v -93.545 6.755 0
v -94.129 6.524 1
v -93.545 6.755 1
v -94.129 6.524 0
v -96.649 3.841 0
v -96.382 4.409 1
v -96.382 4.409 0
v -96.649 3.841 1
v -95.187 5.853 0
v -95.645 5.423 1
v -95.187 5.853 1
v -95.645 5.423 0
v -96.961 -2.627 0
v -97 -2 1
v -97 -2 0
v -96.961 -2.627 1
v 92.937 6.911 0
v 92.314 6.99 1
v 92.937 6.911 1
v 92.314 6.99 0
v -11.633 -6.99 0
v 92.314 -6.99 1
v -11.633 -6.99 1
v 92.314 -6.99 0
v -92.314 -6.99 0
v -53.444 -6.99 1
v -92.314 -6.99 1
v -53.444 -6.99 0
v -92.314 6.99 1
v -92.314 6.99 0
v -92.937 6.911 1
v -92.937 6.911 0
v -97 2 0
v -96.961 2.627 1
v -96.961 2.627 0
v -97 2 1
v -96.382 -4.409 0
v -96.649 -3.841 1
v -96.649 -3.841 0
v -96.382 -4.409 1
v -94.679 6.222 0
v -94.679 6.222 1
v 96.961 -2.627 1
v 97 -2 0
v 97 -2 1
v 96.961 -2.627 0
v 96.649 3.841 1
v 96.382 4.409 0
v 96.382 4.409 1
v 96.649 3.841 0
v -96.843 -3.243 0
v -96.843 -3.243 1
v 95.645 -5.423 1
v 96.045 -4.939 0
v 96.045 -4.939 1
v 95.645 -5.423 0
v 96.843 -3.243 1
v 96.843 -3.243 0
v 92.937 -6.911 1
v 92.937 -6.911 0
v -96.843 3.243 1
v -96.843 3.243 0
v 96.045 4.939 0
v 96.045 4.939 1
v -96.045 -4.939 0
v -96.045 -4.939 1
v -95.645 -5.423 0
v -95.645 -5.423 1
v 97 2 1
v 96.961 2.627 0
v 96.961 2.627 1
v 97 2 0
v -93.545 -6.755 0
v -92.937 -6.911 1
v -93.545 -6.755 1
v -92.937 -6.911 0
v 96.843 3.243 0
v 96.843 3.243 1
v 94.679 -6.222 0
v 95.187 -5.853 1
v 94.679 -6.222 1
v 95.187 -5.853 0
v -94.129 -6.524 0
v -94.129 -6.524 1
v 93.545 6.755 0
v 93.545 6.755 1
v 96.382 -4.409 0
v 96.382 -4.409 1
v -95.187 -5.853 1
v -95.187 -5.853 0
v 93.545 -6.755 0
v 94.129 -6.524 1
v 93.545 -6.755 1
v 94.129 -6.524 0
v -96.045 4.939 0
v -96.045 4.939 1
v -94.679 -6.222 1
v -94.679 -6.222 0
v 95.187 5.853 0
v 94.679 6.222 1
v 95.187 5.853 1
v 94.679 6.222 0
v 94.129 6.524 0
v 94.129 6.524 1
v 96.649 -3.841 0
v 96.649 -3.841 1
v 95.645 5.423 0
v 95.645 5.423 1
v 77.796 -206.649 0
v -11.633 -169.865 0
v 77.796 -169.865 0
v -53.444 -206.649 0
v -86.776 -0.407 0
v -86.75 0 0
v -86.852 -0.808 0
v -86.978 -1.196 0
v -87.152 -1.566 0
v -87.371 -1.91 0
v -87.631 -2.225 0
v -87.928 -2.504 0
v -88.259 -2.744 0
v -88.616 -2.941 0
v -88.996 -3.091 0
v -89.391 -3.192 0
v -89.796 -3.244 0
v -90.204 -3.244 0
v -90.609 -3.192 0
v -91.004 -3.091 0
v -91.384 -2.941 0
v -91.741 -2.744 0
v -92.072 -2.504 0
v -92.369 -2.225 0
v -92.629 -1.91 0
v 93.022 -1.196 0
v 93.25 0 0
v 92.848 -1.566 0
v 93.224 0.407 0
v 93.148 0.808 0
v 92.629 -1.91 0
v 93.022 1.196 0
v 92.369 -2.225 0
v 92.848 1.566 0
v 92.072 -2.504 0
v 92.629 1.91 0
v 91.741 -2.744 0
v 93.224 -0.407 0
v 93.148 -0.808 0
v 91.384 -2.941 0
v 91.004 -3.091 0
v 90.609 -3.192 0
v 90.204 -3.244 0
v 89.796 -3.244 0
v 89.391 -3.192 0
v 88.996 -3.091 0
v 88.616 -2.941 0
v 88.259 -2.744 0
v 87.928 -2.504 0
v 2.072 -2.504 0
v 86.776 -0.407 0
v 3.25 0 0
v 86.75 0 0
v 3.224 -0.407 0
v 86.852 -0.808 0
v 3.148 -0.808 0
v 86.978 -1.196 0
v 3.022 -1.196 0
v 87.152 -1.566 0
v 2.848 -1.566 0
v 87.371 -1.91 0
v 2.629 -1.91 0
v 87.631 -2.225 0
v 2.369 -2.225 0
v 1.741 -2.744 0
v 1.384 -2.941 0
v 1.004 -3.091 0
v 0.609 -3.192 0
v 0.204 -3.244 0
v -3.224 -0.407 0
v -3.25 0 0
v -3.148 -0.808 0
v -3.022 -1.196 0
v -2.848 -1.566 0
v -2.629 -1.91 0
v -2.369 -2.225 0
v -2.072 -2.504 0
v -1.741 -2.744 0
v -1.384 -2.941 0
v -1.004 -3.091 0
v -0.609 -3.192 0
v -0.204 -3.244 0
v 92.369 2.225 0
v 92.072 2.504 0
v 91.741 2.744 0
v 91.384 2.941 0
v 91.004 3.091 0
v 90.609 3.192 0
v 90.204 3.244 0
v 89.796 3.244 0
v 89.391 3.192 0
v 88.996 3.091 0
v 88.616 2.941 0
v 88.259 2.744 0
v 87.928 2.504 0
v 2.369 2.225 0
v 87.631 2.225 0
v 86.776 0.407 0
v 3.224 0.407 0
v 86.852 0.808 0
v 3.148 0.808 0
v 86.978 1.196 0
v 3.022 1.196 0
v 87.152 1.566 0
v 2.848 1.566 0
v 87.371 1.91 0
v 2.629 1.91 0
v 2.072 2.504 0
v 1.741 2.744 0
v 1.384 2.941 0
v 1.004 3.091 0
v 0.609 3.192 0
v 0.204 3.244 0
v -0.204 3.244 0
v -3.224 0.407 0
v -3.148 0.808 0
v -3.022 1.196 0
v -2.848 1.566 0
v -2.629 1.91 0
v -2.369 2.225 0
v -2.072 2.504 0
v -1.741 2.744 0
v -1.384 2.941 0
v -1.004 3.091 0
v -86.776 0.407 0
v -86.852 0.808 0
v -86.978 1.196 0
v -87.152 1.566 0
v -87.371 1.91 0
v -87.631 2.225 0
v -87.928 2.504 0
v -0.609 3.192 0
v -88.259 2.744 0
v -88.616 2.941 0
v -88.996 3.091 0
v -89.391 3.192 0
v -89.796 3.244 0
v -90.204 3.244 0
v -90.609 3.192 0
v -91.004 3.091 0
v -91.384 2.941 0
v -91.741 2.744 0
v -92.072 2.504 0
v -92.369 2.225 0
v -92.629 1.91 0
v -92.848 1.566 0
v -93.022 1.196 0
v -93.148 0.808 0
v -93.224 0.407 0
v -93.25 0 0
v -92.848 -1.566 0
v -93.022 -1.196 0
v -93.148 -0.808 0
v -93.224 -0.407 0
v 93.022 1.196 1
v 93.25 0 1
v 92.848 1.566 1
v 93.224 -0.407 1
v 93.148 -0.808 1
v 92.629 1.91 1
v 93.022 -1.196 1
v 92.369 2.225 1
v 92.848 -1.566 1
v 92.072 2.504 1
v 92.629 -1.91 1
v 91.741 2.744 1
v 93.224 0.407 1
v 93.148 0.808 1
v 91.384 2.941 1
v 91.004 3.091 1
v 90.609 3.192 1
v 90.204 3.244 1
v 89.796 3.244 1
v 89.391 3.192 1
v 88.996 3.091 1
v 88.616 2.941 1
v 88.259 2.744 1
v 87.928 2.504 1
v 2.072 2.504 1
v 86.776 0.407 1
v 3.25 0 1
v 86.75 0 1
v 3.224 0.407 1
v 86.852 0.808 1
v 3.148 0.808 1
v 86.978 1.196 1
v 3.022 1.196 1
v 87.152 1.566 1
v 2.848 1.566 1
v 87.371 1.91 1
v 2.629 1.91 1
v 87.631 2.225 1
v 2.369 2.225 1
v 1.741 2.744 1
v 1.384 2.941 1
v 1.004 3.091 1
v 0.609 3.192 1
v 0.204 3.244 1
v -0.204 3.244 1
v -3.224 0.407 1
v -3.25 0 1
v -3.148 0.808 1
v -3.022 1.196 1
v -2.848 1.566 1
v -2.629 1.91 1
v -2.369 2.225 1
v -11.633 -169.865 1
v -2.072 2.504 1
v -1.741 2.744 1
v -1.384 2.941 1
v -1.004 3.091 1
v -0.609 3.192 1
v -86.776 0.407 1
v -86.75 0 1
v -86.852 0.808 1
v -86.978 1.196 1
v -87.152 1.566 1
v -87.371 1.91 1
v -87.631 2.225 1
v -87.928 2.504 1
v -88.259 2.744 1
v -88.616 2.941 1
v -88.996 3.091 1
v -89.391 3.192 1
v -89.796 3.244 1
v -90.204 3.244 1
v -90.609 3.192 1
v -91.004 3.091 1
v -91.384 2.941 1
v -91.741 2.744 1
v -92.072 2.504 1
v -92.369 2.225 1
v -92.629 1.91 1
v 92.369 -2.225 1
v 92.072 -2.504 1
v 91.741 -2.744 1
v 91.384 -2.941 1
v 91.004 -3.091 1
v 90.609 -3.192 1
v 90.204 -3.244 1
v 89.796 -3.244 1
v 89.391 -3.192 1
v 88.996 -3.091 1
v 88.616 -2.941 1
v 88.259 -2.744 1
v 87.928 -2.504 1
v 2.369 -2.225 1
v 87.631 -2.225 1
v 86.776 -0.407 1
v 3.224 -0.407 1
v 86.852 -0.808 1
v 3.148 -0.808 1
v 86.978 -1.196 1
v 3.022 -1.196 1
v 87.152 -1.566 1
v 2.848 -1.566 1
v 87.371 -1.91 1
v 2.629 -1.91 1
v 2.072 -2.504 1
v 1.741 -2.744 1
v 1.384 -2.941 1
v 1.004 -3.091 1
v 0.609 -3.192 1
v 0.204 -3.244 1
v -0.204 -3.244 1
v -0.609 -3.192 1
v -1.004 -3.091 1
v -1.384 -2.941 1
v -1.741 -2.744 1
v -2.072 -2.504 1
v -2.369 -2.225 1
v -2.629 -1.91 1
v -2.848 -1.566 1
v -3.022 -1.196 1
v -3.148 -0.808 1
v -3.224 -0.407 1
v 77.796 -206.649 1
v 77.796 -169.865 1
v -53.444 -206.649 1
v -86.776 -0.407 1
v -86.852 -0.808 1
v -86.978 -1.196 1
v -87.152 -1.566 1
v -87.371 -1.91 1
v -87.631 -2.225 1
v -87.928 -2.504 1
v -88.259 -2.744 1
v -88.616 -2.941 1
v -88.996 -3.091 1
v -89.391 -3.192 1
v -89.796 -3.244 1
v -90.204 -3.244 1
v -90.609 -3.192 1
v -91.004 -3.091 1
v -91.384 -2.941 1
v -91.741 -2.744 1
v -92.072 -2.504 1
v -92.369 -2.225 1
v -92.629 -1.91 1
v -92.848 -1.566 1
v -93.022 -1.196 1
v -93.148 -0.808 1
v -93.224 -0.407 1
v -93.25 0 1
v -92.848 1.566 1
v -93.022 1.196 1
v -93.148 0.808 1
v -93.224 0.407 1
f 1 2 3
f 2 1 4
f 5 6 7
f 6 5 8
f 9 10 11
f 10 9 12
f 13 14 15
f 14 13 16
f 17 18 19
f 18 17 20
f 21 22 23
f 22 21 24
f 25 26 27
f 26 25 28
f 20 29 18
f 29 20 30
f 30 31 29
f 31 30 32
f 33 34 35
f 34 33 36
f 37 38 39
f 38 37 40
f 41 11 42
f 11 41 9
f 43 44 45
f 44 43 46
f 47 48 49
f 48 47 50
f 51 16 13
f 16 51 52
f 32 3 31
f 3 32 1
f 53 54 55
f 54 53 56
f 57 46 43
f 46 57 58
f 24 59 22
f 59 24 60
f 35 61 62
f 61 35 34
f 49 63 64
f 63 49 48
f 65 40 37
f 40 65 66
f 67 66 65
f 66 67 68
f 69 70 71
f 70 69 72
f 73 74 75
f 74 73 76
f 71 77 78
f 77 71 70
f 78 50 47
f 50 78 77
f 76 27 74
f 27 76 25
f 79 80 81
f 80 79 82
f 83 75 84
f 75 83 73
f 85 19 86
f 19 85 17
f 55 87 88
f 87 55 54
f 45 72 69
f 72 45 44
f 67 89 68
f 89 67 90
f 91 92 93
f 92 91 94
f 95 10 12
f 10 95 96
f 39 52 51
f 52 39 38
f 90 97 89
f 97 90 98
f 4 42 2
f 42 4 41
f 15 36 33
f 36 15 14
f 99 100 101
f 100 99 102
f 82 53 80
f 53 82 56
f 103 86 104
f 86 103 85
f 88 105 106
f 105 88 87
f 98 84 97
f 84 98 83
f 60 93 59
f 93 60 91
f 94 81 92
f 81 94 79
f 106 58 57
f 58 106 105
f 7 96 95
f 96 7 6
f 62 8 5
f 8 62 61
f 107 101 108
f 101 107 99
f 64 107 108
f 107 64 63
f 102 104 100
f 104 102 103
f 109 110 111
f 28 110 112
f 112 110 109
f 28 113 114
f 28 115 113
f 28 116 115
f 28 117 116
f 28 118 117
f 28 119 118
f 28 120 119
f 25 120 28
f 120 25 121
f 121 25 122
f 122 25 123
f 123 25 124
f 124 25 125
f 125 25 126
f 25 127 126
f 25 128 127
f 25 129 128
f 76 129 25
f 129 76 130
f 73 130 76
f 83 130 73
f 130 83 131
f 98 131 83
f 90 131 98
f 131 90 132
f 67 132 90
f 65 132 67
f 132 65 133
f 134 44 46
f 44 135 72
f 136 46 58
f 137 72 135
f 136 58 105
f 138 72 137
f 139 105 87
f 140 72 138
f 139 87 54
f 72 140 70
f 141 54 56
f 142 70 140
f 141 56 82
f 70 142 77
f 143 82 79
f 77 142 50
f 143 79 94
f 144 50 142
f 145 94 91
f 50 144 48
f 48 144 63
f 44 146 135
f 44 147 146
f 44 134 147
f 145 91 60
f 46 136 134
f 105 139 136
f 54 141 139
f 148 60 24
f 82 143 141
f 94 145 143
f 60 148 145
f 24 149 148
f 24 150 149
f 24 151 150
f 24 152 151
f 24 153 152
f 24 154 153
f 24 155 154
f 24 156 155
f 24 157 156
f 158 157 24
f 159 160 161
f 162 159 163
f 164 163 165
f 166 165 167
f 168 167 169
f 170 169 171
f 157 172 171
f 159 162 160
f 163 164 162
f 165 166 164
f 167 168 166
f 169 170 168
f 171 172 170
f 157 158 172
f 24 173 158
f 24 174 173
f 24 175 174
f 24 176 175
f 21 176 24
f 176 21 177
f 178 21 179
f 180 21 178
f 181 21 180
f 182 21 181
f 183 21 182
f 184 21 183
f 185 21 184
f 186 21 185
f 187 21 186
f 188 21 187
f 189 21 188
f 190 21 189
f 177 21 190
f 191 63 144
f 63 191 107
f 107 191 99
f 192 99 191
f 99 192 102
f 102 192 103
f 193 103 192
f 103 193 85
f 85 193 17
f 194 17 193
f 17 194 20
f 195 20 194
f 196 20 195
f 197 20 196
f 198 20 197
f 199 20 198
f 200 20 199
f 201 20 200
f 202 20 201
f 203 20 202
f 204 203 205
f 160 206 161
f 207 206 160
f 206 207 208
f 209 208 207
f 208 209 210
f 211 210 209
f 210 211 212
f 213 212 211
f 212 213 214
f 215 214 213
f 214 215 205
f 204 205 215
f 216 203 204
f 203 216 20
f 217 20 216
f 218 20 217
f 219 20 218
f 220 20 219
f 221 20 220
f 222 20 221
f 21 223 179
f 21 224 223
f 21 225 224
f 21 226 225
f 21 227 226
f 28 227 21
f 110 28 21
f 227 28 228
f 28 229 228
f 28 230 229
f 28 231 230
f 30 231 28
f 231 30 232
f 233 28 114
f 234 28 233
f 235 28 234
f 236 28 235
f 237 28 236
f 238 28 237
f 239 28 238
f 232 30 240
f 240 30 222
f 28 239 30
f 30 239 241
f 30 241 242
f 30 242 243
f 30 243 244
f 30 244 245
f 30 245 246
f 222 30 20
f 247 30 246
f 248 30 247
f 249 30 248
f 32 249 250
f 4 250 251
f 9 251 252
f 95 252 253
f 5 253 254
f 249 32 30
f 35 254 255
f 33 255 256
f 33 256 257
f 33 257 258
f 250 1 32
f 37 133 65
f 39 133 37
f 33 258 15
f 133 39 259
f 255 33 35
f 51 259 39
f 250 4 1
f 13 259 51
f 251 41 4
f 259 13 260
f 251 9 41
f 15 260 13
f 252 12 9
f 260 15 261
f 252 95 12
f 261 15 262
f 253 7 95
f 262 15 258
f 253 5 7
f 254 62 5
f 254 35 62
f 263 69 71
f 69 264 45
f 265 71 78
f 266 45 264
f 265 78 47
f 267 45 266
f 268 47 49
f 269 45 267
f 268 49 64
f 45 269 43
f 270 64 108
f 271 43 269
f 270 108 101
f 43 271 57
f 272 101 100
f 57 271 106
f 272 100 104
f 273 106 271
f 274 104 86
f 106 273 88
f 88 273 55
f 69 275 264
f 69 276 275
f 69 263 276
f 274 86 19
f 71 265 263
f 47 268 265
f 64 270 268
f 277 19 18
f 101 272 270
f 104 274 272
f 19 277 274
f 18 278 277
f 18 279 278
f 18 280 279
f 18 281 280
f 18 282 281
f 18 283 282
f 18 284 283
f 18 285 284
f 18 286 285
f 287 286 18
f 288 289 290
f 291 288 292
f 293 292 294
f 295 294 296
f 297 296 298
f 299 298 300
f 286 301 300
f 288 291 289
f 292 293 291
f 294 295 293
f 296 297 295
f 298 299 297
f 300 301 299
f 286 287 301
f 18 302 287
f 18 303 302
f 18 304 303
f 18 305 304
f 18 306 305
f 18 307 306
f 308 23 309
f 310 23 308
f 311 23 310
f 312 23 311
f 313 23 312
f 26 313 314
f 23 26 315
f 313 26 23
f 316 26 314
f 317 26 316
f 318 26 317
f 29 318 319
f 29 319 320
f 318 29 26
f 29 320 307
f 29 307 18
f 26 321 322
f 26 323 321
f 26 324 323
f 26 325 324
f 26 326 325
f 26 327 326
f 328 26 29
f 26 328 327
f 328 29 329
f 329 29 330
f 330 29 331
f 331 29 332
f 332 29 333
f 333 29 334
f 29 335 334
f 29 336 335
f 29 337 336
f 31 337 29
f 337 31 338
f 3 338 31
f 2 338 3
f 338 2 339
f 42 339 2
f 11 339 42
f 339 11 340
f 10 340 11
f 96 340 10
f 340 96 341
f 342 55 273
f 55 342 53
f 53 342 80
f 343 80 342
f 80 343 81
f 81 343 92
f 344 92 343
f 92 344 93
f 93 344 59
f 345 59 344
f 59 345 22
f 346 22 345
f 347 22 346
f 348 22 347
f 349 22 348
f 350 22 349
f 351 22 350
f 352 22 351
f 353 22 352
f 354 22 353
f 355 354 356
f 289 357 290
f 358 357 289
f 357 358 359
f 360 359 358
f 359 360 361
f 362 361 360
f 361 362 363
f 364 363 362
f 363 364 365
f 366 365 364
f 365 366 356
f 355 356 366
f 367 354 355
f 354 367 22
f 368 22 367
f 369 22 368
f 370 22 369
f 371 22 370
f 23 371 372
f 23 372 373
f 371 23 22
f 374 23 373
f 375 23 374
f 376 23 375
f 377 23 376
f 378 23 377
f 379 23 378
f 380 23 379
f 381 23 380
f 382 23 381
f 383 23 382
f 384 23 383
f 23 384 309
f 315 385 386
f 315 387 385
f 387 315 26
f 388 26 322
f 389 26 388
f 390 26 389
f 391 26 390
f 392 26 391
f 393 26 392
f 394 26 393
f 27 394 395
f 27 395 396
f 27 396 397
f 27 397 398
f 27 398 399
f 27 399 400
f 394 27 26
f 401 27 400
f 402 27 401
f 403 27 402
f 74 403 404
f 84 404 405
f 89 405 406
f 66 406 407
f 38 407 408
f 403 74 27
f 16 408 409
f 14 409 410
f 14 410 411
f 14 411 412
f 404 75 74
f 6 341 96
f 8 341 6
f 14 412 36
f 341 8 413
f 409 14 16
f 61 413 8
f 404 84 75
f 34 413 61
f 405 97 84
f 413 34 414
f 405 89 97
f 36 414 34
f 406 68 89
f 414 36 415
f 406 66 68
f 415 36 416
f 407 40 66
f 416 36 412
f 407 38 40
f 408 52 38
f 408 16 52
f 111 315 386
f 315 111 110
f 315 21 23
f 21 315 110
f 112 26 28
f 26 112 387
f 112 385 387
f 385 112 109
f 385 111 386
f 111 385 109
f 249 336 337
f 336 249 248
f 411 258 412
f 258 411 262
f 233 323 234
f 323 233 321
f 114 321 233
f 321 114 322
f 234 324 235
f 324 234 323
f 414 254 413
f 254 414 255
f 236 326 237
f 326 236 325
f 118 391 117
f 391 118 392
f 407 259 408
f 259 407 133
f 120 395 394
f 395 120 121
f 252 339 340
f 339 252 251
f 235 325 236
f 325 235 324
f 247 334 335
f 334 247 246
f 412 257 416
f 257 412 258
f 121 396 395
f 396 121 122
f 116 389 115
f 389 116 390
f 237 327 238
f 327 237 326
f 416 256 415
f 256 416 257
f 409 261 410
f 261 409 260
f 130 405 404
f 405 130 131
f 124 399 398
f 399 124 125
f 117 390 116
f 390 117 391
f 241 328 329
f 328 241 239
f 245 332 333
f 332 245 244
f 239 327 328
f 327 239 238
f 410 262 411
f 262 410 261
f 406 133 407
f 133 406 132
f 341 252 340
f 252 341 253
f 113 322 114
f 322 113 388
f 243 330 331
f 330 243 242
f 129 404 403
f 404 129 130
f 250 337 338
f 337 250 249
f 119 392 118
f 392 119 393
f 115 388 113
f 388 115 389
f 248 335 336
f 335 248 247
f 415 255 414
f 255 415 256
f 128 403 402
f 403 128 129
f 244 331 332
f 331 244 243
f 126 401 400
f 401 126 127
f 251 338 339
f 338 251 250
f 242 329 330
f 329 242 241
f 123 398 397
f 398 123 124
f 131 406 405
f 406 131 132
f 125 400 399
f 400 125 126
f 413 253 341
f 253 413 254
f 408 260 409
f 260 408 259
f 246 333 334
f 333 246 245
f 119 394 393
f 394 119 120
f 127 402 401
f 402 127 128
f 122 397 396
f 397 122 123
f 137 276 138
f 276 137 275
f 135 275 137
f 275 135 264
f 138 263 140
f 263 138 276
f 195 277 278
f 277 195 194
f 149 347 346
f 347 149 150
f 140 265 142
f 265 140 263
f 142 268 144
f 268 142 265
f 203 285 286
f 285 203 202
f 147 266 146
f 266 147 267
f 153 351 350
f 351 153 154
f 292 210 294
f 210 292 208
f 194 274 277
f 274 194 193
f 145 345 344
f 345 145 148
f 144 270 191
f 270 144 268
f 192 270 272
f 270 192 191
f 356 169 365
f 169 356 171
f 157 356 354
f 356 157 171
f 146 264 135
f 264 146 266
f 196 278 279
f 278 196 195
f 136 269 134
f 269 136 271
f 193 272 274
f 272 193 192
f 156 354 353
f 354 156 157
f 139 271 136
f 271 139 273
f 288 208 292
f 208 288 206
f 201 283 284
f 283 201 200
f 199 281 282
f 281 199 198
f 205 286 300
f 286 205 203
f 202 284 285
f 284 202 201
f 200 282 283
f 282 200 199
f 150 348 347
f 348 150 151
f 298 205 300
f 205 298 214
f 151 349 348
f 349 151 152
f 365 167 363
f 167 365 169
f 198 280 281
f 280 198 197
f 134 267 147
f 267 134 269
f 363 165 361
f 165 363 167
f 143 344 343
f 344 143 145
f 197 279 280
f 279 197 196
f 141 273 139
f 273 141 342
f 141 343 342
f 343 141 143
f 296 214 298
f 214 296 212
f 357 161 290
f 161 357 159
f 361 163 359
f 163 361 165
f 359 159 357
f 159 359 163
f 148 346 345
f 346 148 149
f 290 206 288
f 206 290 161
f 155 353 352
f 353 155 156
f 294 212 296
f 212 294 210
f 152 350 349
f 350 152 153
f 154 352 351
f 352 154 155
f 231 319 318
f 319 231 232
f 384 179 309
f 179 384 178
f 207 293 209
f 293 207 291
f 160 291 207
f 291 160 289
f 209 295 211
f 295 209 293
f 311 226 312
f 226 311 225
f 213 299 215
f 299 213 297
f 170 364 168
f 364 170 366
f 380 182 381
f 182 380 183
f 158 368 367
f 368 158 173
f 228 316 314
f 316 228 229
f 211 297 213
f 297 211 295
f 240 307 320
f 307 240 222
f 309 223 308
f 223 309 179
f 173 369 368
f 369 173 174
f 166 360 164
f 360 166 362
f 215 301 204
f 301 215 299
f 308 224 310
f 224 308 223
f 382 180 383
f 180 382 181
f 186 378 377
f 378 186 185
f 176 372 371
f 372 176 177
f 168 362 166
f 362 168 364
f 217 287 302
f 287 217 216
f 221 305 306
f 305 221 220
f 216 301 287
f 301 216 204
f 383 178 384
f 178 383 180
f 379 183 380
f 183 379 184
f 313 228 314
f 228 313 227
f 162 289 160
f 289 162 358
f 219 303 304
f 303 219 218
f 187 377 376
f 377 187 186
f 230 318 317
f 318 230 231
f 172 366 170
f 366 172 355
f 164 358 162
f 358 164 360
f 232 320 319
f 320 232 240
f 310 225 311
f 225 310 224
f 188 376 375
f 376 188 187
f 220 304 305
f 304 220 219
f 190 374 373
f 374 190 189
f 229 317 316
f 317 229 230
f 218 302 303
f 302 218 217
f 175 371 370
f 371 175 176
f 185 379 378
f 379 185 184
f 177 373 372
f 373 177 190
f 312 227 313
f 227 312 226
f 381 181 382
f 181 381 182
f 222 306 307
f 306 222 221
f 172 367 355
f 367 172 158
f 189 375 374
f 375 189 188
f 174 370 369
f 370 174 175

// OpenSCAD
$fn = 50;


difference() {
	union() {
		translate(v = [0, 0, 0]) {
			rotate(a = [0, 0, 0]) {
				hull() {
					translate(v = [-92.0000000000, 2.0000000000, 0]) {
						rotate(a = [0, 0, 0]) {
							translate(v = [0, 0, 0]) {
								rotate(a = [0, 0, 0]) {
									cylinder(h = 1, r = 5);
								}
							}
						}
					}
					translate(v = [92.0000000000, 2.0000000000, 0]) {
						rotate(a = [0, 0, 0]) {
							translate(v = [0, 0, 0]) {
								rotate(a = [0, 0, 0]) {
									cylinder(h = 1, r = 5);
								}
							}
						}
					}
					translate(v = [-92.0000000000, -2.0000000000, 0]) {
						rotate(a = [0, 0, 0]) {
							translate(v = [0, 0, 0]) {
								rotate(a = [0, 0, 0]) {
									cylinder(h = 1, r = 5);
								}
							}
						}
					}
					translate(v = [92.0000000000, -2.0000000000, 0]) {
						rotate(a = [0, 0, 0]) {
							translate(v = [0, 0, 0]) {
								rotate(a = [0, 0, 0]) {
									cylinder(h = 1, r = 5);
								}
							}
						}
					}
				}
			}
		}
		translate(v = [0, 0, 0]) {
			rotate(a = [0, 0, 0]) {
				linear_extrude(height = 1) {
					text(font = "DejaVu Sans Mono:style=Bold", halign = "center", size = 209.0000000000, text = "L", valign = "top");
				}
			}
		}
	}
	union() {
		translate(v = [-90.0000000000, 0.0000000000, -125.0000000000]) {
			rotate(a = [0, 0, 0]) {
				cylinder(h = 250, r = 3.2500000000);
			}
		}
		translate(v = [90.0000000000, 0.0000000000, -125.0000000000]) {
			rotate(a = [0, 0, 0]) {
				cylinder(h = 250, r = 3.2500000000);
			}
		}
		translate(v = [90.0000000000, 0.0000000000, -125.0000000000]) {
			rotate(a = [0, 0, 0]) {
				cylinder(h = 250, r = 3.2500000000);
			}
		}
		translate(v = [0, 0, -125.0000000000]) {
			rotate(a = [0, 0, 0]) {
				cylinder(h = 250, r = 3.2500000000);
			}
		}
	}
}
